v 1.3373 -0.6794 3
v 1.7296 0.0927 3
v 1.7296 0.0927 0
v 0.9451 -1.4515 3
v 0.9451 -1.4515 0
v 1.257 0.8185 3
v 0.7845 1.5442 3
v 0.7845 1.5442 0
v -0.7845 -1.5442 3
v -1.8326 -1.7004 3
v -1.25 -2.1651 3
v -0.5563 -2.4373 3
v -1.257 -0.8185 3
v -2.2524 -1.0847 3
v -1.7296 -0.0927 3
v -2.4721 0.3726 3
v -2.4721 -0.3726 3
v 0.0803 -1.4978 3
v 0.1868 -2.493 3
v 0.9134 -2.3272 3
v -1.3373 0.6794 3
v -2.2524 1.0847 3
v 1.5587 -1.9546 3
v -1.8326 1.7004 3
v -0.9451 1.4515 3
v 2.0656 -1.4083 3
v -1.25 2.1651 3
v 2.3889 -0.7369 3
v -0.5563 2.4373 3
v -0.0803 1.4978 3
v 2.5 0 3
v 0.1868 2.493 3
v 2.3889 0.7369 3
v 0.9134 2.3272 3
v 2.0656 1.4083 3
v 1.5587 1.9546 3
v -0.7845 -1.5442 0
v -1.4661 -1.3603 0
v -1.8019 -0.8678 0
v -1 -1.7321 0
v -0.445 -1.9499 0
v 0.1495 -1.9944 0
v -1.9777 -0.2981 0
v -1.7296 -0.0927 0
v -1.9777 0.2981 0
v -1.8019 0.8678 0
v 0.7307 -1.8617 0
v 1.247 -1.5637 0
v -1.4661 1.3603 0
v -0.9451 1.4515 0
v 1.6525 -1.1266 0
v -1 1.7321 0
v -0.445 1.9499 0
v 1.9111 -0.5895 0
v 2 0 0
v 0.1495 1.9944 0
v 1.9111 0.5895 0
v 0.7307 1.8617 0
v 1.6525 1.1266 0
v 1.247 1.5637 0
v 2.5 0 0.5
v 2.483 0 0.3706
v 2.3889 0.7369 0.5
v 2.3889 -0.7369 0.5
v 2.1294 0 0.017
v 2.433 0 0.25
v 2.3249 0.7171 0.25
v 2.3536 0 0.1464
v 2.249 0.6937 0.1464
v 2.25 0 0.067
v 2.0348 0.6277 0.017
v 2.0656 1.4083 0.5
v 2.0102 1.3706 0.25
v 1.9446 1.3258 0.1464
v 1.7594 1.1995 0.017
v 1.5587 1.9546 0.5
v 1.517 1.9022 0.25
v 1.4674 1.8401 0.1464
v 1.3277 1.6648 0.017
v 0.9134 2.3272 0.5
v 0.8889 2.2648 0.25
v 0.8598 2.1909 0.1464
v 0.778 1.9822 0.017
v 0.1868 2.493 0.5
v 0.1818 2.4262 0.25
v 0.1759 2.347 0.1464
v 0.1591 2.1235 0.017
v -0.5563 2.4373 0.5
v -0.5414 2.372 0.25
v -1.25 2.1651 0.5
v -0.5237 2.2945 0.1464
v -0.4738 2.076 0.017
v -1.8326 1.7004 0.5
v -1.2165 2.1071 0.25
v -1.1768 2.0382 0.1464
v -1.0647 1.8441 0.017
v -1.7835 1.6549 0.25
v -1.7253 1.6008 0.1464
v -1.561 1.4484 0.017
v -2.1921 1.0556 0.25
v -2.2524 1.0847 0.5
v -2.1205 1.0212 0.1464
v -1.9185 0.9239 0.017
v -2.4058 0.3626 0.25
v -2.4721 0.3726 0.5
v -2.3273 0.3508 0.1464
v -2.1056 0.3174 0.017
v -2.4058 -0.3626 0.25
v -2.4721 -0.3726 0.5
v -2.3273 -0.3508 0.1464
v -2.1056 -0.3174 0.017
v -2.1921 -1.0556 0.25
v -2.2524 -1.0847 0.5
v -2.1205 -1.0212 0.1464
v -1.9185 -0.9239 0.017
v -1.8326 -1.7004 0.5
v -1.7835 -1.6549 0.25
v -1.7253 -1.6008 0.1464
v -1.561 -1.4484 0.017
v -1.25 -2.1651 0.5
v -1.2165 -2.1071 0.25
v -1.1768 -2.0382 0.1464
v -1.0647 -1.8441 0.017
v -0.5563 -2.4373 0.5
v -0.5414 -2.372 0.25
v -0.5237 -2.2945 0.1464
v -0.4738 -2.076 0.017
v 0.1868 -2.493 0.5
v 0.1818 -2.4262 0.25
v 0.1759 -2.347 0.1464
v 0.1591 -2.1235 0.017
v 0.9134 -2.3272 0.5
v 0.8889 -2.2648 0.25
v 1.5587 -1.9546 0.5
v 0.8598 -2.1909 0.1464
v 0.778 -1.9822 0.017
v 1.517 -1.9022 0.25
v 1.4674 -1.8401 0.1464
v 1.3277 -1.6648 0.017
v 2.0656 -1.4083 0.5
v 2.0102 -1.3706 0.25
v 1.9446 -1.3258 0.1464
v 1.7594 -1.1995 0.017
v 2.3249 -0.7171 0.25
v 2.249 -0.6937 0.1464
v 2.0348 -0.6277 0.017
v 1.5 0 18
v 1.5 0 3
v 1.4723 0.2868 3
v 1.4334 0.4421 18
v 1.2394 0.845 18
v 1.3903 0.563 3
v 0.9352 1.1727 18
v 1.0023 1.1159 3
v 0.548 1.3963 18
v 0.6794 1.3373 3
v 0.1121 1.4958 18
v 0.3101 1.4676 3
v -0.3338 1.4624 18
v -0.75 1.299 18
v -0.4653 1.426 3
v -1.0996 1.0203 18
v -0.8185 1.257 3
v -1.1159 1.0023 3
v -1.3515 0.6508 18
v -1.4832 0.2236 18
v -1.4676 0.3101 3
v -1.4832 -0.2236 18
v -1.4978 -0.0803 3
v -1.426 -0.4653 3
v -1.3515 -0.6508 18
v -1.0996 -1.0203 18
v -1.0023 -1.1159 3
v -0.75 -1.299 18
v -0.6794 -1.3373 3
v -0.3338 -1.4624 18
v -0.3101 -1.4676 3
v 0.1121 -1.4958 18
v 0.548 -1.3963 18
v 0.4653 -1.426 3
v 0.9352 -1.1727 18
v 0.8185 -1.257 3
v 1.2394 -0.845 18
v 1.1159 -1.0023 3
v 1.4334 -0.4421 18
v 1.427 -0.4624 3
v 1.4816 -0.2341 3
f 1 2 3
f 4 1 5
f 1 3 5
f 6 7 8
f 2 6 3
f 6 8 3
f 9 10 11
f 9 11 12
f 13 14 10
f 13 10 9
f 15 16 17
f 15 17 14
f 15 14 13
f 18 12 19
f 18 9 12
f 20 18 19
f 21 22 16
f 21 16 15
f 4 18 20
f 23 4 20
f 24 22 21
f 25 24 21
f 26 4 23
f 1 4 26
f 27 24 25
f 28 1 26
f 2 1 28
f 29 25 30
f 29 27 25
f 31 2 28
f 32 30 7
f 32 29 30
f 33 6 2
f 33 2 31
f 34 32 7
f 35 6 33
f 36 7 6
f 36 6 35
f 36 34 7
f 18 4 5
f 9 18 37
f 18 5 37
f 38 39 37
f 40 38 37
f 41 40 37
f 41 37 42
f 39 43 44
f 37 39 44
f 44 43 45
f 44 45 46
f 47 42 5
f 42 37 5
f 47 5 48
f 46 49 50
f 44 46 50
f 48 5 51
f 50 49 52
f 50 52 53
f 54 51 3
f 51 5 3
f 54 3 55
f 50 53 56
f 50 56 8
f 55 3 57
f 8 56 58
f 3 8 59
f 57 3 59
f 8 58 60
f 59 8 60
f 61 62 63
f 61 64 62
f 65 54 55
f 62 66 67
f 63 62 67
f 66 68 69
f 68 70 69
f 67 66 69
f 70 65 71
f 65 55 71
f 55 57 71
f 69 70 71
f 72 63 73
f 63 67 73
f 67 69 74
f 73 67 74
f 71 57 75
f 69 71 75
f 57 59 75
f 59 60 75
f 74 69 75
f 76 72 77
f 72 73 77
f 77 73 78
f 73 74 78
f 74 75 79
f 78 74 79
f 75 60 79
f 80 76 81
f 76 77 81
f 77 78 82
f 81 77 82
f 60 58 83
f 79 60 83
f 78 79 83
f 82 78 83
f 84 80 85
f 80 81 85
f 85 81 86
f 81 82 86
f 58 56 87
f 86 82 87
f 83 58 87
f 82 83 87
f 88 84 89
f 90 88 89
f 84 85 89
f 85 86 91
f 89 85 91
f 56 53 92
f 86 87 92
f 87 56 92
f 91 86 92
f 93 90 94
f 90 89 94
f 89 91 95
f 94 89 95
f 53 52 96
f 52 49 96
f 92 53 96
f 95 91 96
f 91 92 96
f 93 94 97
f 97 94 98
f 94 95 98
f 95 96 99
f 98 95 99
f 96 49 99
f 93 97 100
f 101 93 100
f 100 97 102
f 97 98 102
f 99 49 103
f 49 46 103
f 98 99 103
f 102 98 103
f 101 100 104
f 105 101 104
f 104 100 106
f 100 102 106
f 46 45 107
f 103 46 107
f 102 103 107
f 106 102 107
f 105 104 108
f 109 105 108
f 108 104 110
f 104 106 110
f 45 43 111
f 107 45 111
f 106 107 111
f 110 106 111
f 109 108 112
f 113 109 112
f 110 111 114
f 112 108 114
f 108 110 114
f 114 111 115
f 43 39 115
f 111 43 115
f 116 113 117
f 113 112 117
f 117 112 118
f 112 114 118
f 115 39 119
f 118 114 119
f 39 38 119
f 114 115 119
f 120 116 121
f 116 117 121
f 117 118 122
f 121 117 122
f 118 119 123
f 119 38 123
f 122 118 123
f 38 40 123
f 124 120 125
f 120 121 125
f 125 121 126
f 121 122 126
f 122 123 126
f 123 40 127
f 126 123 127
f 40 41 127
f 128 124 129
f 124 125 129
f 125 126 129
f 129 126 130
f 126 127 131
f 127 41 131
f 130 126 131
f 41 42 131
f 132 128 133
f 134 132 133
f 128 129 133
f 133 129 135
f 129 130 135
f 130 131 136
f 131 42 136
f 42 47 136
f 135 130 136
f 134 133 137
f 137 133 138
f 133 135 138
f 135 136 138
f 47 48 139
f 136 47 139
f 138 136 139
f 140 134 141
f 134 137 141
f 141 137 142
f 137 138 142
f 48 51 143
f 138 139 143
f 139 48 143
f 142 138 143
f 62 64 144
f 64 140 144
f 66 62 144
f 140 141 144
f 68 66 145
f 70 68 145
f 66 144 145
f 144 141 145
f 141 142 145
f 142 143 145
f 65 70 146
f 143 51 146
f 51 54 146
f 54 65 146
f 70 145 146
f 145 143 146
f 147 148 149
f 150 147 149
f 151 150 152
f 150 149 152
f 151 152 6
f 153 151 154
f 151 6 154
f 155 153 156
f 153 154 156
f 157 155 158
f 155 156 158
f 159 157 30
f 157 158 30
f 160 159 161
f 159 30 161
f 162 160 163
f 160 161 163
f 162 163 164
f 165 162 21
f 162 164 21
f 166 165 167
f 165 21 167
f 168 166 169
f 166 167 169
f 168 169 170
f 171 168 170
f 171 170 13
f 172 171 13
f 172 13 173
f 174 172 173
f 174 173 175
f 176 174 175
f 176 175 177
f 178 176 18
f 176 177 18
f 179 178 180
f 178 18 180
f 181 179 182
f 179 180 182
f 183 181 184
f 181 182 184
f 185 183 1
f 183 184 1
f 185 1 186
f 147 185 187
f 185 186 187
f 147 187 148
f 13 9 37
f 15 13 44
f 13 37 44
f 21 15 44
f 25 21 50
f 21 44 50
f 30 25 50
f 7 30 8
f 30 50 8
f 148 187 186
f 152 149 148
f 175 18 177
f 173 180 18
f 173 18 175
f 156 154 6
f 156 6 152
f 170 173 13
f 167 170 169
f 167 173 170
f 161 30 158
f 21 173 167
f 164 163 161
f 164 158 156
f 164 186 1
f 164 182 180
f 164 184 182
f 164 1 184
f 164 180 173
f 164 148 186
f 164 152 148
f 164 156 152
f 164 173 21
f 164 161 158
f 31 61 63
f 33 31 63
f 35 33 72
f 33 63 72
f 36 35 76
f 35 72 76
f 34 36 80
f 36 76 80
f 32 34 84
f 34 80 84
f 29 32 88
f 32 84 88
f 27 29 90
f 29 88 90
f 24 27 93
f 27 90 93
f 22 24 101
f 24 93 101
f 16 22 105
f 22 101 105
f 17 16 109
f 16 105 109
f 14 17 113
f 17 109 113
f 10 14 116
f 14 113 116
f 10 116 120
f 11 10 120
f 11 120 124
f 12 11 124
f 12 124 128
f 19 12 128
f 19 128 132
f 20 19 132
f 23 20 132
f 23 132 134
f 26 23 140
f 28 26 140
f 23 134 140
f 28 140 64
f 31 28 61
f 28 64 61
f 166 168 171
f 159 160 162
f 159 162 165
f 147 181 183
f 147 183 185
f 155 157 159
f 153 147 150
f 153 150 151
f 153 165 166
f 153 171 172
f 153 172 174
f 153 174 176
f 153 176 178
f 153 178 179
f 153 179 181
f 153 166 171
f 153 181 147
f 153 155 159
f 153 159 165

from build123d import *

# Parameters (mm, degrees)
SKETCH1_R           = 2.5
BOSS_EXTRUDE1_DEPTH = 3
SKETCH2_R           = 1.5
BOSS_EXTRUDE2_DEPTH = 15
CUT_EXTRUDE1_DEPTH  = 3
FILLET1_R           = 0.5


with BuildPart() as part:
    # Sketch1 → Boss-Extrude1 (new body)
    with BuildSketch(Plane.XY):
        Circle(SKETCH1_R)
    extrude(amount=BOSS_EXTRUDE1_DEPTH)

    # Sketch2 → Boss-Extrude2 (add)
    with BuildSketch(Plane.XY.offset(3)):
        Circle(SKETCH2_R)
    extrude(amount=BOSS_EXTRUDE2_DEPTH)

    # Sketch3 → Cut-Extrude1 (cut)
    with BuildSketch(Plane(origin=(0, 0, 0), x_dir=(-1, 0, 0), z_dir=(0, 0, -1))):
        Polygon((0.784462107, -1.544221229), (1.729565866, -0.092746502), (0.94510376, 1.451474727), (-0.784462107, 1.544221229), (-1.729565866, 0.092746502), (-0.94510376, -1.451474727), align=None)
    extrude(amount=-CUT_EXTRUDE1_DEPTH, mode=Mode.SUBTRACT)

    # Fillet1
    fillet1_edges = [part.edges().sort_by_distance(p)[0] for p in [
        (-2.5, 0, 0),
    ]]
    fillet(fillet1_edges, radius=FILLET1_R)


solid = part.part
